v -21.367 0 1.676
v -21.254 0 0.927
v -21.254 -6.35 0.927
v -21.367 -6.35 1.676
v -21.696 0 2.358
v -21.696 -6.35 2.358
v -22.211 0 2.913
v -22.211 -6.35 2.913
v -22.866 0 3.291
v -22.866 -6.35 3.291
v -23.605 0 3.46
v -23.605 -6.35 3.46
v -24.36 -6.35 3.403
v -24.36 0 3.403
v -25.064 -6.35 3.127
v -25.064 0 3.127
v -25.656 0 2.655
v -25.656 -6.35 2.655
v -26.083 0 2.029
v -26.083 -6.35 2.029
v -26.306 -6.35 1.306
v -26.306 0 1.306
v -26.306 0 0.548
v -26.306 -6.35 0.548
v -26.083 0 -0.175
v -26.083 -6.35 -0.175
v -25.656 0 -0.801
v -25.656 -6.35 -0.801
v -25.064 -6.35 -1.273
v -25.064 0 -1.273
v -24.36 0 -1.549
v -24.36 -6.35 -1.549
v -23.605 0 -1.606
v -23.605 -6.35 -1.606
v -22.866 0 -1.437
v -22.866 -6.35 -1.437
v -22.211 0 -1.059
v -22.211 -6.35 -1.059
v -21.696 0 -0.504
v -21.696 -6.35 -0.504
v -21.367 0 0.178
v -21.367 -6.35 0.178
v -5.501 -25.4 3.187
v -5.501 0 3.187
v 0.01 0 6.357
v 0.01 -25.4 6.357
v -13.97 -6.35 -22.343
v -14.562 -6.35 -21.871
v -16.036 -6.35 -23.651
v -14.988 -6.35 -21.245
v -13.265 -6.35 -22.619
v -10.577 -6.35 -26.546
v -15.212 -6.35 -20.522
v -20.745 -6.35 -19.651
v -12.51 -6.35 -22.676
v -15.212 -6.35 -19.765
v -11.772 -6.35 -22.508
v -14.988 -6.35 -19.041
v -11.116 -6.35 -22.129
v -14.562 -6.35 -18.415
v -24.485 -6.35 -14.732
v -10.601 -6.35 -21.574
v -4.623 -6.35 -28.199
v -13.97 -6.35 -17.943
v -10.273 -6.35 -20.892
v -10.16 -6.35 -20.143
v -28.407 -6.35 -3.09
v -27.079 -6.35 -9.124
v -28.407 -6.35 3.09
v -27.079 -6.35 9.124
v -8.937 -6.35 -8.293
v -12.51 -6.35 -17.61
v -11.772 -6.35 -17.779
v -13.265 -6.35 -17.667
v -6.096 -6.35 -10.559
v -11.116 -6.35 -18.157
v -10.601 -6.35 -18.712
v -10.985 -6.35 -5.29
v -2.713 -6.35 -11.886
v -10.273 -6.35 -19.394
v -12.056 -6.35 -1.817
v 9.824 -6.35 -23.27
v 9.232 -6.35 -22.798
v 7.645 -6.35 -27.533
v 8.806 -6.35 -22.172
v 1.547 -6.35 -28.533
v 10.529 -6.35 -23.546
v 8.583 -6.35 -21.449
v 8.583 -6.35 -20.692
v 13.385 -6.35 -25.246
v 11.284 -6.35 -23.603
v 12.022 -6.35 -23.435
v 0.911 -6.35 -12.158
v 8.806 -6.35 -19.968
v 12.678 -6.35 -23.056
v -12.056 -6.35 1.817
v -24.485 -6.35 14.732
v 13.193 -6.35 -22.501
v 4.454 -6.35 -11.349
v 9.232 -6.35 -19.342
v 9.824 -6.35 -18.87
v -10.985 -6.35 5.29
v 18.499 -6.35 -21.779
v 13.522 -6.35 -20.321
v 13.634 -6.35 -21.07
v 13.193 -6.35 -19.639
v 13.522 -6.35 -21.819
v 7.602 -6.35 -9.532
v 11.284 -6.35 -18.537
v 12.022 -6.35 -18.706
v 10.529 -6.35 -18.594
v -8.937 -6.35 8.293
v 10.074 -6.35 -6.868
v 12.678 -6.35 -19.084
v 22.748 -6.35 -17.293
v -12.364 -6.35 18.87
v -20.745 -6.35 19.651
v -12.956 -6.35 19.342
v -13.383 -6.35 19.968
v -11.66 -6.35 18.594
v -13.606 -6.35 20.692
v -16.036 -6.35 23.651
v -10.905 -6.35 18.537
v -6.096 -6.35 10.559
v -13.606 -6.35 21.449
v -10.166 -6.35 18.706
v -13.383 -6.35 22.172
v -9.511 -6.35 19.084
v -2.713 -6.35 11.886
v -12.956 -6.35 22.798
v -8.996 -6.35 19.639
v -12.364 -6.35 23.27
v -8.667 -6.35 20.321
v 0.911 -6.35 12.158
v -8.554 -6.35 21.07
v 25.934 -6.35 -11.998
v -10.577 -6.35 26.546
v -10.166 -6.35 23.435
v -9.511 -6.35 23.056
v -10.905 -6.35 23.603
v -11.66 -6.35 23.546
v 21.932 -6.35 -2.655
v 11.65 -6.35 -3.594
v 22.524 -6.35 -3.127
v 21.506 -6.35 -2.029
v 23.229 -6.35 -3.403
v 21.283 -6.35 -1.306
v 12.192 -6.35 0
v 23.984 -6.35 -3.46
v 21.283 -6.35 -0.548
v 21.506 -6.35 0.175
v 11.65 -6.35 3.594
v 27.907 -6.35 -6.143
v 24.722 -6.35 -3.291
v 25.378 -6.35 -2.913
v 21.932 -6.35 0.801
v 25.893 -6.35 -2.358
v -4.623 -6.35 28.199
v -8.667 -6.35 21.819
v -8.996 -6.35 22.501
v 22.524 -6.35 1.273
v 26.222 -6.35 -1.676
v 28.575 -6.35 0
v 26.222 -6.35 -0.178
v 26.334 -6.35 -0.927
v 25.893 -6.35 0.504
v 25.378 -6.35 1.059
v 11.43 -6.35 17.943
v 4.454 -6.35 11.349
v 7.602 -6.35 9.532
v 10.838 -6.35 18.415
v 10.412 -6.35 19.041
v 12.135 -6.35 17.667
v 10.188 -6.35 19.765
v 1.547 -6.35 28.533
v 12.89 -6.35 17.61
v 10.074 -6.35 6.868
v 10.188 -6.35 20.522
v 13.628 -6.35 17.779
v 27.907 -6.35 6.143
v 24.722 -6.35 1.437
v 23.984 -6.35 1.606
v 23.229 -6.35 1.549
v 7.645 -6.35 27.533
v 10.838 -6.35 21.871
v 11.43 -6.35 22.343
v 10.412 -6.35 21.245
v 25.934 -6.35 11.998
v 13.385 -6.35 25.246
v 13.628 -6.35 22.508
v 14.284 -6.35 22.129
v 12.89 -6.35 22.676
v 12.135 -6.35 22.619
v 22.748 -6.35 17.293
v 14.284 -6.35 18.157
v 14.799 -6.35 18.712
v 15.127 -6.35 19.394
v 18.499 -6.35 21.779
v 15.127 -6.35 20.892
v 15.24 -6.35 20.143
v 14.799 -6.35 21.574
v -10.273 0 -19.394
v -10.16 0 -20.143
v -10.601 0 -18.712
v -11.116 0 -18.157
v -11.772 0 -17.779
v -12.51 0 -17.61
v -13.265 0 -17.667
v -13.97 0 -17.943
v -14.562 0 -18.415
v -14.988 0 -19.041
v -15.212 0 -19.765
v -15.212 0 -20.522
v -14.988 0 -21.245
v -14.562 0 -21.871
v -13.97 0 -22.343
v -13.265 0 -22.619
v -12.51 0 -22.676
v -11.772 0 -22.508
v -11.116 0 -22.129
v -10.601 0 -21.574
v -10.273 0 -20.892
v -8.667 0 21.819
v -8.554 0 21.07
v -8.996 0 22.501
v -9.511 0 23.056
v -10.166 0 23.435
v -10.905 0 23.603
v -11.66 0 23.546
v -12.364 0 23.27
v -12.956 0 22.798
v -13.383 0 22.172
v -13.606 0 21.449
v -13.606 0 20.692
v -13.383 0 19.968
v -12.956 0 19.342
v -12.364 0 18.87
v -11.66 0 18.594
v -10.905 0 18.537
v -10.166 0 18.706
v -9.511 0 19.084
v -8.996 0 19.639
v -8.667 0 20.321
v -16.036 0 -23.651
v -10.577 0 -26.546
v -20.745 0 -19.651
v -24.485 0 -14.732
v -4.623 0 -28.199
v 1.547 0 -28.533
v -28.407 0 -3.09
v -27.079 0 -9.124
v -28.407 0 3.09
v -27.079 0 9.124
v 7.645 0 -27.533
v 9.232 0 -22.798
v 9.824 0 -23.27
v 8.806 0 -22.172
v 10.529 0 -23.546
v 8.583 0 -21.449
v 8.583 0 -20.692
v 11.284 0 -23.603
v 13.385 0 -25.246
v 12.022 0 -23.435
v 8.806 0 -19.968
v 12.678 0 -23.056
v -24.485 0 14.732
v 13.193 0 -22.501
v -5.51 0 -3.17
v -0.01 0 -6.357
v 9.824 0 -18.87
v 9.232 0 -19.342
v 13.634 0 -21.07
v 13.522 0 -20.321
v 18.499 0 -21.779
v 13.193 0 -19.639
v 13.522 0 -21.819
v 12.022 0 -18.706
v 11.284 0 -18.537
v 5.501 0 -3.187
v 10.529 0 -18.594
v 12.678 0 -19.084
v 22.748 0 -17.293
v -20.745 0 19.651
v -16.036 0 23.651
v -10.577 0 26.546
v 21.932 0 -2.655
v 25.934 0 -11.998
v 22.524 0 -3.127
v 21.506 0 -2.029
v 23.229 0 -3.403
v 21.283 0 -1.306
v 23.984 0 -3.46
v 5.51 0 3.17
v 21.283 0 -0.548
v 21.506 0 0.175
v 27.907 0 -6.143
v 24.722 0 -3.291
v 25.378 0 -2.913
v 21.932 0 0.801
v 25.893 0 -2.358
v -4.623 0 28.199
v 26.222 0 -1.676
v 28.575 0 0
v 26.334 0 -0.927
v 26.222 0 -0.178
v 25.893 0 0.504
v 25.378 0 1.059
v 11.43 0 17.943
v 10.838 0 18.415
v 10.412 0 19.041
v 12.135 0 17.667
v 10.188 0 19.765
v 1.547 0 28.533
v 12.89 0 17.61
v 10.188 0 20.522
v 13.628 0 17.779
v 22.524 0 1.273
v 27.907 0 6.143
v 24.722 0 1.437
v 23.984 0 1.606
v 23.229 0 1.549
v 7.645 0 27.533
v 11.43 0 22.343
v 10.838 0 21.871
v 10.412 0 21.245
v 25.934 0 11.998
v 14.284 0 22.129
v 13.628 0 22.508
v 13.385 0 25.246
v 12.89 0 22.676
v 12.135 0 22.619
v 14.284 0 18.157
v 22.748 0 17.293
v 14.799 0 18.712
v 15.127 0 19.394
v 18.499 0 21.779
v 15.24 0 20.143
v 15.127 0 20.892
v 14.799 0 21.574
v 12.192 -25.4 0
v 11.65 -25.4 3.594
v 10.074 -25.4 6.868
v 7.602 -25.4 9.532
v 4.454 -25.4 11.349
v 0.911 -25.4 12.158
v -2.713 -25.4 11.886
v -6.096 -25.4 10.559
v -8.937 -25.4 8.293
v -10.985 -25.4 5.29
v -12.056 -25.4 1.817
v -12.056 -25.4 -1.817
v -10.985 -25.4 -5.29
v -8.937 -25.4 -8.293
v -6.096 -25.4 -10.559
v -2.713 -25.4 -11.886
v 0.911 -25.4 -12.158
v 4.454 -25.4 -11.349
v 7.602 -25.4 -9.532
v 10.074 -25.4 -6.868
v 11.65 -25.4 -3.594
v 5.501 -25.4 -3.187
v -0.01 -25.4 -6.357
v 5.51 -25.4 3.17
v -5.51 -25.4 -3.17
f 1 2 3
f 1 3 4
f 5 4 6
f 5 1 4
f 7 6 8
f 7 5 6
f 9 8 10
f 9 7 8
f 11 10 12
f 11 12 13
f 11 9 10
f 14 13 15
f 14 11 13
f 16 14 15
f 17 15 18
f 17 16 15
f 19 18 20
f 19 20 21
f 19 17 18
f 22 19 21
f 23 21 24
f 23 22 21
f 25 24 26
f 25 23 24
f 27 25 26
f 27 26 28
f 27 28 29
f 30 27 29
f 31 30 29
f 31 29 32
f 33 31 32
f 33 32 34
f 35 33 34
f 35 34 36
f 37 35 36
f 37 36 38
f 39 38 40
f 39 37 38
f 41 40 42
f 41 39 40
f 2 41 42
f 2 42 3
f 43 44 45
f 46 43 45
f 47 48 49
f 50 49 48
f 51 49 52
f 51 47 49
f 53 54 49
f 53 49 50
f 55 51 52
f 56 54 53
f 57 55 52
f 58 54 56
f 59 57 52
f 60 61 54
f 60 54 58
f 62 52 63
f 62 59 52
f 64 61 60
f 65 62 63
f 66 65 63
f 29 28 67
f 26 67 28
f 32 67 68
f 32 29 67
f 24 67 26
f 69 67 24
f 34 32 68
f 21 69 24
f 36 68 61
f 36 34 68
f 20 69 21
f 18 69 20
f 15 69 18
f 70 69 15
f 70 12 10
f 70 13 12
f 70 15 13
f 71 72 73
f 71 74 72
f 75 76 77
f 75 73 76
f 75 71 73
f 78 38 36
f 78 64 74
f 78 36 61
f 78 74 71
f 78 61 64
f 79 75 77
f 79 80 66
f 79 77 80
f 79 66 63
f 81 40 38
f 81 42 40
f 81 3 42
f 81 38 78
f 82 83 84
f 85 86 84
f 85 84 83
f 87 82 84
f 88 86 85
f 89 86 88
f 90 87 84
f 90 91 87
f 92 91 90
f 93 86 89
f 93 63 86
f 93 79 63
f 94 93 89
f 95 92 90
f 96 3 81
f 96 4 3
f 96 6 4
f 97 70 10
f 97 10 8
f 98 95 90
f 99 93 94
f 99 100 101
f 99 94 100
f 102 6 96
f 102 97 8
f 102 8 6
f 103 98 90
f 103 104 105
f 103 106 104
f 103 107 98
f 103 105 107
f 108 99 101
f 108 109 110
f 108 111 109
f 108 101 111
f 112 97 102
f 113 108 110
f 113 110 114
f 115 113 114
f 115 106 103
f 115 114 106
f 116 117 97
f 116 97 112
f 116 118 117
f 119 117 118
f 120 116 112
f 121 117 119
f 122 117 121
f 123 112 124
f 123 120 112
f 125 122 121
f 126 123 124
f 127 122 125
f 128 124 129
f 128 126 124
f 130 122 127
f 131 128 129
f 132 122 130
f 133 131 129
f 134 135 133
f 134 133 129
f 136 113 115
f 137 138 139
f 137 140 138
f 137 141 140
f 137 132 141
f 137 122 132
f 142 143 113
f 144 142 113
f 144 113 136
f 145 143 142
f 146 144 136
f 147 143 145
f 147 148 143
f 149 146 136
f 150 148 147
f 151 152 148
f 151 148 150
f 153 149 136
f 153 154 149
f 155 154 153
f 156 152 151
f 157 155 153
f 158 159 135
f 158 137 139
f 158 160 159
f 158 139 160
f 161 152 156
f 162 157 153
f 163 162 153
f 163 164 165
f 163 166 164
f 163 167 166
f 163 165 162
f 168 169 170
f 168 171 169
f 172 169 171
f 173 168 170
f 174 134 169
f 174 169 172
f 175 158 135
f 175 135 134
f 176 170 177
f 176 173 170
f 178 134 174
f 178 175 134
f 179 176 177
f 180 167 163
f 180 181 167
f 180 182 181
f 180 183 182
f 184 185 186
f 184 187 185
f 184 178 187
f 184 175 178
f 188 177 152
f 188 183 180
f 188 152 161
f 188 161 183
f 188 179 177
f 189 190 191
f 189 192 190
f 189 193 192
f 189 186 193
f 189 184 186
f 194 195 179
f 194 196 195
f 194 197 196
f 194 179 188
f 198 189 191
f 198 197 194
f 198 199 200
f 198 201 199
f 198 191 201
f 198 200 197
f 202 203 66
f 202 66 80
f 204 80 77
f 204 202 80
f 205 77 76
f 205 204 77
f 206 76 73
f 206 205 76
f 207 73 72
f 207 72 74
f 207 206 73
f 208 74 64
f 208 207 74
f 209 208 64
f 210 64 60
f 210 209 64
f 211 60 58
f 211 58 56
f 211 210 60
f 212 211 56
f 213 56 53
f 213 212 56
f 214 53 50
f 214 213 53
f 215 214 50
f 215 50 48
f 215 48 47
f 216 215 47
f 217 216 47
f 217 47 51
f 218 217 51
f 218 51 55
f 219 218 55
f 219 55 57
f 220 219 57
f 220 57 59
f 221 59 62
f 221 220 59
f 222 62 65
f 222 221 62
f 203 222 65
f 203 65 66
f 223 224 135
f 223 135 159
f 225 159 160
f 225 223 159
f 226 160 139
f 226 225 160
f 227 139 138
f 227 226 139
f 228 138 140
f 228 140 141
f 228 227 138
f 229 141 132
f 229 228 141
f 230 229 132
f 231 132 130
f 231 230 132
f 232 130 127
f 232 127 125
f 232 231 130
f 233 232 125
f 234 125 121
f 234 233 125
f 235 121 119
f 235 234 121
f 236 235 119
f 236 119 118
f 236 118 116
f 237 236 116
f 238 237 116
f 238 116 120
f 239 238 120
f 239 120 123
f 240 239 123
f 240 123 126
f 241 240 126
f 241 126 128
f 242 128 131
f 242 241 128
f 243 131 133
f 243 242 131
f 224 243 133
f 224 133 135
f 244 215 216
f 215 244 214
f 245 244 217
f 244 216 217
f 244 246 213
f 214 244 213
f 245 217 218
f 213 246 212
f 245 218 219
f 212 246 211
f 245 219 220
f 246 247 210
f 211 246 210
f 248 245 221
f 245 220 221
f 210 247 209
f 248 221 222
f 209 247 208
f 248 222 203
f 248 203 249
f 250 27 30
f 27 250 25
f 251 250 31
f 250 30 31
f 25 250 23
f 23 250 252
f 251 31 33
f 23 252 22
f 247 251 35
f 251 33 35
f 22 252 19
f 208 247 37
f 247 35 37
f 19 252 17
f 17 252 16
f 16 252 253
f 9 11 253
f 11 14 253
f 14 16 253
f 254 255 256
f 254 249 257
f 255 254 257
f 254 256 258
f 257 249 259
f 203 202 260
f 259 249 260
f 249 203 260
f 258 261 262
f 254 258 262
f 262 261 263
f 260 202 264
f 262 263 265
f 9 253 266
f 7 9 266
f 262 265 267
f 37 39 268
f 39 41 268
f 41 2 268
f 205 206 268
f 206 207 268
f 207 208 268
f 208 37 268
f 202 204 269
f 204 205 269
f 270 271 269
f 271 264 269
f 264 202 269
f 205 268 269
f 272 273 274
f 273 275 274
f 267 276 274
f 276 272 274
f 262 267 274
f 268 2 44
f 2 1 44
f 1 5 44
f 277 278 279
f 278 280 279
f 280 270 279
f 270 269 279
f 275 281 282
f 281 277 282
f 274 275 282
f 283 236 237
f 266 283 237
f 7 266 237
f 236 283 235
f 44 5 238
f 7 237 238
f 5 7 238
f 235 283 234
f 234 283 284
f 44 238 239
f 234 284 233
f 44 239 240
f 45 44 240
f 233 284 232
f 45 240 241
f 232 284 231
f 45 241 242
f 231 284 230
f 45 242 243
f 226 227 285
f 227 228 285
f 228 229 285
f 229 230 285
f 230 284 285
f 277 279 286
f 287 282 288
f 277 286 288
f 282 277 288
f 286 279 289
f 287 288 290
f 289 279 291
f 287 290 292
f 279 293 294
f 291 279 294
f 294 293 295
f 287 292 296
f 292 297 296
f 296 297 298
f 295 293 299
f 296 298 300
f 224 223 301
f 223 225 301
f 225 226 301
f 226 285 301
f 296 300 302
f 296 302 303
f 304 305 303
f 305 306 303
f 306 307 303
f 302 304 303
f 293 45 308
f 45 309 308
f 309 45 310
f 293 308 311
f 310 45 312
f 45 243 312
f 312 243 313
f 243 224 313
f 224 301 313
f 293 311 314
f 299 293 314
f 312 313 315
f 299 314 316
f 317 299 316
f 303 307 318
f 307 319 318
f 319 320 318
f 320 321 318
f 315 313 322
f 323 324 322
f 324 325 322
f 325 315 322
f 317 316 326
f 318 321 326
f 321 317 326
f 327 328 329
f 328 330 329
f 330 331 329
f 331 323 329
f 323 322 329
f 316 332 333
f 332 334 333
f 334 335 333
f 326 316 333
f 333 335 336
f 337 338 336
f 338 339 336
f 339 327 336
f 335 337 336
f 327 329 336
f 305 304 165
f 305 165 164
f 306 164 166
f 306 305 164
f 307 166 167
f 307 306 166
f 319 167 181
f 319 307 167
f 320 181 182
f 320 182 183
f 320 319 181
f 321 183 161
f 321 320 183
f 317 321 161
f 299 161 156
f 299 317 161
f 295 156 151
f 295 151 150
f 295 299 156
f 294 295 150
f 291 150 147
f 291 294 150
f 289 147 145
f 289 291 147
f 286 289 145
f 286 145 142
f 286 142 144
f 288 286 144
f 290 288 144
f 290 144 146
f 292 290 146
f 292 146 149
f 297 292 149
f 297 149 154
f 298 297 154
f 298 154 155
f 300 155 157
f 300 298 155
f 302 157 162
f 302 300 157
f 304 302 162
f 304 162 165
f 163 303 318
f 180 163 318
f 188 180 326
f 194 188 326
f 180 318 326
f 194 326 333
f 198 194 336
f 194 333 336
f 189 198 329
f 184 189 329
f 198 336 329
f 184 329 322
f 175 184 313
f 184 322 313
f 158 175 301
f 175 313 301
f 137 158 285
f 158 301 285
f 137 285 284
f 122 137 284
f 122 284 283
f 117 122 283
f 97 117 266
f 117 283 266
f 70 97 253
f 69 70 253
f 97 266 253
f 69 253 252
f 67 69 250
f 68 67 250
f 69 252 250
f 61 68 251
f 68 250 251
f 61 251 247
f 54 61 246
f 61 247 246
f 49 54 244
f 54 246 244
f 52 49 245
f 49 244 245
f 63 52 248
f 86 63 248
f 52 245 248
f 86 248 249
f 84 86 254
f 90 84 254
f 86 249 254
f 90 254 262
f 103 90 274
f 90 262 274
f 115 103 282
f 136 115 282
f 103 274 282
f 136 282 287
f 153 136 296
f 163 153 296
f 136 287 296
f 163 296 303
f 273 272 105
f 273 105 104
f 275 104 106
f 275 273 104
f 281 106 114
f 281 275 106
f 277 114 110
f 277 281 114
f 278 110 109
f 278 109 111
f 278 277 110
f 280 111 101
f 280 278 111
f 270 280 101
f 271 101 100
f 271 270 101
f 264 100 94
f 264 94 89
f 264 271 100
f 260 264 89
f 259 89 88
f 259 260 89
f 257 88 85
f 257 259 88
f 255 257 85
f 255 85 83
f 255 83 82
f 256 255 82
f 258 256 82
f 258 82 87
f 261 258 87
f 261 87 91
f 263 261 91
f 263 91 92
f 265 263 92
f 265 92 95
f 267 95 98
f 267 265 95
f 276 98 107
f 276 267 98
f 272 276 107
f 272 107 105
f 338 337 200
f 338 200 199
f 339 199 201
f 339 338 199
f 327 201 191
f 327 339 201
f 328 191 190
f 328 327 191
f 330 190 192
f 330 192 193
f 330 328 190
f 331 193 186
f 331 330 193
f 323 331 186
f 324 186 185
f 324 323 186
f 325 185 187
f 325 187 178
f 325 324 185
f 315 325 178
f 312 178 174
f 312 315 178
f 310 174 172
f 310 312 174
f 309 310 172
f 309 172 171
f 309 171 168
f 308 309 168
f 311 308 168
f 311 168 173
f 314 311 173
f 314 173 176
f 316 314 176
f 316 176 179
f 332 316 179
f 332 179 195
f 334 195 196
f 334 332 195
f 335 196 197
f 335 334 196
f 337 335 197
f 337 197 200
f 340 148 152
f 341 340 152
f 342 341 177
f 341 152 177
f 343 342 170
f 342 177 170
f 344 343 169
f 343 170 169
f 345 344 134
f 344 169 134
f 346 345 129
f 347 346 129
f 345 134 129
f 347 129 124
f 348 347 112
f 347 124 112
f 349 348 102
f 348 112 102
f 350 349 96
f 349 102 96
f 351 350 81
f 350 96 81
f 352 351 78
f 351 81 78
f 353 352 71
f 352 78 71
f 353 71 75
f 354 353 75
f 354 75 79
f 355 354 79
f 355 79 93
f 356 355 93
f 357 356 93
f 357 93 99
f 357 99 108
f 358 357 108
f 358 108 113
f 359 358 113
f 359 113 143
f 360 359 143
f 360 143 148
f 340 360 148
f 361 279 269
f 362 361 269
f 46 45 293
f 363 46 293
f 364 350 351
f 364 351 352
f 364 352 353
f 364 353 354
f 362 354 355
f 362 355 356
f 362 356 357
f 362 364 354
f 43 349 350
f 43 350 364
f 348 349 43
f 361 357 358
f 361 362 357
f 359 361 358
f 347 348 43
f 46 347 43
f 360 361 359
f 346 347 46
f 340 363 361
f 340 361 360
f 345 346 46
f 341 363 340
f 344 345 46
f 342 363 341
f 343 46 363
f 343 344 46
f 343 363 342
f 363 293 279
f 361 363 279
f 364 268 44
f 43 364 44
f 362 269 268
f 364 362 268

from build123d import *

# Parameters (mm, degrees)
F0_R     = 28.575
F0_R_2   = 2.54
F0_R_3   = 12.192
F1_DEPTH = 6.35
F2_DEPTH = 25.4


with BuildPart() as f1:
    # F0 (on Front) → F1 (new body)
    with BuildSketch(Plane.XZ):
        Circle(F0_R)
        with Locations((-12.7, -20.143117)):
            Circle(F0_R_2, mode=Mode.SUBTRACT)
        with Locations((11.094451, -21.070081)):
            Circle(F0_R_2, mode=Mode.SUBTRACT)
        with Locations((23.794451, -0.926964)):
            Circle(F0_R_2, mode=Mode.SUBTRACT)
        with Locations((-23.794451, 0.926964)):
            Circle(F0_R_2, mode=Mode.SUBTRACT)
        with Locations((-11.094451, 21.070081)):
            Circle(F0_R_2, mode=Mode.SUBTRACT)
        Circle(F0_R_3, mode=Mode.SUBTRACT)
        with Locations((12.7, 20.143117)):
            Circle(F0_R_2, mode=Mode.SUBTRACT)
    extrude(amount=F1_DEPTH)

    # F0 (on Front) → F2 (join)
    with BuildSketch(Plane.XZ):
        Circle(F0_R_3)
        Polygon((-5.500707, 3.186898), (0.009581, 6.357201), (5.510288, 3.170303), (5.500707, -3.186898), (-0.009581, -6.357201), (-5.510288, -3.170303), align=None, mode=Mode.SUBTRACT)
    extrude(amount=F2_DEPTH)


solid = f1.part
